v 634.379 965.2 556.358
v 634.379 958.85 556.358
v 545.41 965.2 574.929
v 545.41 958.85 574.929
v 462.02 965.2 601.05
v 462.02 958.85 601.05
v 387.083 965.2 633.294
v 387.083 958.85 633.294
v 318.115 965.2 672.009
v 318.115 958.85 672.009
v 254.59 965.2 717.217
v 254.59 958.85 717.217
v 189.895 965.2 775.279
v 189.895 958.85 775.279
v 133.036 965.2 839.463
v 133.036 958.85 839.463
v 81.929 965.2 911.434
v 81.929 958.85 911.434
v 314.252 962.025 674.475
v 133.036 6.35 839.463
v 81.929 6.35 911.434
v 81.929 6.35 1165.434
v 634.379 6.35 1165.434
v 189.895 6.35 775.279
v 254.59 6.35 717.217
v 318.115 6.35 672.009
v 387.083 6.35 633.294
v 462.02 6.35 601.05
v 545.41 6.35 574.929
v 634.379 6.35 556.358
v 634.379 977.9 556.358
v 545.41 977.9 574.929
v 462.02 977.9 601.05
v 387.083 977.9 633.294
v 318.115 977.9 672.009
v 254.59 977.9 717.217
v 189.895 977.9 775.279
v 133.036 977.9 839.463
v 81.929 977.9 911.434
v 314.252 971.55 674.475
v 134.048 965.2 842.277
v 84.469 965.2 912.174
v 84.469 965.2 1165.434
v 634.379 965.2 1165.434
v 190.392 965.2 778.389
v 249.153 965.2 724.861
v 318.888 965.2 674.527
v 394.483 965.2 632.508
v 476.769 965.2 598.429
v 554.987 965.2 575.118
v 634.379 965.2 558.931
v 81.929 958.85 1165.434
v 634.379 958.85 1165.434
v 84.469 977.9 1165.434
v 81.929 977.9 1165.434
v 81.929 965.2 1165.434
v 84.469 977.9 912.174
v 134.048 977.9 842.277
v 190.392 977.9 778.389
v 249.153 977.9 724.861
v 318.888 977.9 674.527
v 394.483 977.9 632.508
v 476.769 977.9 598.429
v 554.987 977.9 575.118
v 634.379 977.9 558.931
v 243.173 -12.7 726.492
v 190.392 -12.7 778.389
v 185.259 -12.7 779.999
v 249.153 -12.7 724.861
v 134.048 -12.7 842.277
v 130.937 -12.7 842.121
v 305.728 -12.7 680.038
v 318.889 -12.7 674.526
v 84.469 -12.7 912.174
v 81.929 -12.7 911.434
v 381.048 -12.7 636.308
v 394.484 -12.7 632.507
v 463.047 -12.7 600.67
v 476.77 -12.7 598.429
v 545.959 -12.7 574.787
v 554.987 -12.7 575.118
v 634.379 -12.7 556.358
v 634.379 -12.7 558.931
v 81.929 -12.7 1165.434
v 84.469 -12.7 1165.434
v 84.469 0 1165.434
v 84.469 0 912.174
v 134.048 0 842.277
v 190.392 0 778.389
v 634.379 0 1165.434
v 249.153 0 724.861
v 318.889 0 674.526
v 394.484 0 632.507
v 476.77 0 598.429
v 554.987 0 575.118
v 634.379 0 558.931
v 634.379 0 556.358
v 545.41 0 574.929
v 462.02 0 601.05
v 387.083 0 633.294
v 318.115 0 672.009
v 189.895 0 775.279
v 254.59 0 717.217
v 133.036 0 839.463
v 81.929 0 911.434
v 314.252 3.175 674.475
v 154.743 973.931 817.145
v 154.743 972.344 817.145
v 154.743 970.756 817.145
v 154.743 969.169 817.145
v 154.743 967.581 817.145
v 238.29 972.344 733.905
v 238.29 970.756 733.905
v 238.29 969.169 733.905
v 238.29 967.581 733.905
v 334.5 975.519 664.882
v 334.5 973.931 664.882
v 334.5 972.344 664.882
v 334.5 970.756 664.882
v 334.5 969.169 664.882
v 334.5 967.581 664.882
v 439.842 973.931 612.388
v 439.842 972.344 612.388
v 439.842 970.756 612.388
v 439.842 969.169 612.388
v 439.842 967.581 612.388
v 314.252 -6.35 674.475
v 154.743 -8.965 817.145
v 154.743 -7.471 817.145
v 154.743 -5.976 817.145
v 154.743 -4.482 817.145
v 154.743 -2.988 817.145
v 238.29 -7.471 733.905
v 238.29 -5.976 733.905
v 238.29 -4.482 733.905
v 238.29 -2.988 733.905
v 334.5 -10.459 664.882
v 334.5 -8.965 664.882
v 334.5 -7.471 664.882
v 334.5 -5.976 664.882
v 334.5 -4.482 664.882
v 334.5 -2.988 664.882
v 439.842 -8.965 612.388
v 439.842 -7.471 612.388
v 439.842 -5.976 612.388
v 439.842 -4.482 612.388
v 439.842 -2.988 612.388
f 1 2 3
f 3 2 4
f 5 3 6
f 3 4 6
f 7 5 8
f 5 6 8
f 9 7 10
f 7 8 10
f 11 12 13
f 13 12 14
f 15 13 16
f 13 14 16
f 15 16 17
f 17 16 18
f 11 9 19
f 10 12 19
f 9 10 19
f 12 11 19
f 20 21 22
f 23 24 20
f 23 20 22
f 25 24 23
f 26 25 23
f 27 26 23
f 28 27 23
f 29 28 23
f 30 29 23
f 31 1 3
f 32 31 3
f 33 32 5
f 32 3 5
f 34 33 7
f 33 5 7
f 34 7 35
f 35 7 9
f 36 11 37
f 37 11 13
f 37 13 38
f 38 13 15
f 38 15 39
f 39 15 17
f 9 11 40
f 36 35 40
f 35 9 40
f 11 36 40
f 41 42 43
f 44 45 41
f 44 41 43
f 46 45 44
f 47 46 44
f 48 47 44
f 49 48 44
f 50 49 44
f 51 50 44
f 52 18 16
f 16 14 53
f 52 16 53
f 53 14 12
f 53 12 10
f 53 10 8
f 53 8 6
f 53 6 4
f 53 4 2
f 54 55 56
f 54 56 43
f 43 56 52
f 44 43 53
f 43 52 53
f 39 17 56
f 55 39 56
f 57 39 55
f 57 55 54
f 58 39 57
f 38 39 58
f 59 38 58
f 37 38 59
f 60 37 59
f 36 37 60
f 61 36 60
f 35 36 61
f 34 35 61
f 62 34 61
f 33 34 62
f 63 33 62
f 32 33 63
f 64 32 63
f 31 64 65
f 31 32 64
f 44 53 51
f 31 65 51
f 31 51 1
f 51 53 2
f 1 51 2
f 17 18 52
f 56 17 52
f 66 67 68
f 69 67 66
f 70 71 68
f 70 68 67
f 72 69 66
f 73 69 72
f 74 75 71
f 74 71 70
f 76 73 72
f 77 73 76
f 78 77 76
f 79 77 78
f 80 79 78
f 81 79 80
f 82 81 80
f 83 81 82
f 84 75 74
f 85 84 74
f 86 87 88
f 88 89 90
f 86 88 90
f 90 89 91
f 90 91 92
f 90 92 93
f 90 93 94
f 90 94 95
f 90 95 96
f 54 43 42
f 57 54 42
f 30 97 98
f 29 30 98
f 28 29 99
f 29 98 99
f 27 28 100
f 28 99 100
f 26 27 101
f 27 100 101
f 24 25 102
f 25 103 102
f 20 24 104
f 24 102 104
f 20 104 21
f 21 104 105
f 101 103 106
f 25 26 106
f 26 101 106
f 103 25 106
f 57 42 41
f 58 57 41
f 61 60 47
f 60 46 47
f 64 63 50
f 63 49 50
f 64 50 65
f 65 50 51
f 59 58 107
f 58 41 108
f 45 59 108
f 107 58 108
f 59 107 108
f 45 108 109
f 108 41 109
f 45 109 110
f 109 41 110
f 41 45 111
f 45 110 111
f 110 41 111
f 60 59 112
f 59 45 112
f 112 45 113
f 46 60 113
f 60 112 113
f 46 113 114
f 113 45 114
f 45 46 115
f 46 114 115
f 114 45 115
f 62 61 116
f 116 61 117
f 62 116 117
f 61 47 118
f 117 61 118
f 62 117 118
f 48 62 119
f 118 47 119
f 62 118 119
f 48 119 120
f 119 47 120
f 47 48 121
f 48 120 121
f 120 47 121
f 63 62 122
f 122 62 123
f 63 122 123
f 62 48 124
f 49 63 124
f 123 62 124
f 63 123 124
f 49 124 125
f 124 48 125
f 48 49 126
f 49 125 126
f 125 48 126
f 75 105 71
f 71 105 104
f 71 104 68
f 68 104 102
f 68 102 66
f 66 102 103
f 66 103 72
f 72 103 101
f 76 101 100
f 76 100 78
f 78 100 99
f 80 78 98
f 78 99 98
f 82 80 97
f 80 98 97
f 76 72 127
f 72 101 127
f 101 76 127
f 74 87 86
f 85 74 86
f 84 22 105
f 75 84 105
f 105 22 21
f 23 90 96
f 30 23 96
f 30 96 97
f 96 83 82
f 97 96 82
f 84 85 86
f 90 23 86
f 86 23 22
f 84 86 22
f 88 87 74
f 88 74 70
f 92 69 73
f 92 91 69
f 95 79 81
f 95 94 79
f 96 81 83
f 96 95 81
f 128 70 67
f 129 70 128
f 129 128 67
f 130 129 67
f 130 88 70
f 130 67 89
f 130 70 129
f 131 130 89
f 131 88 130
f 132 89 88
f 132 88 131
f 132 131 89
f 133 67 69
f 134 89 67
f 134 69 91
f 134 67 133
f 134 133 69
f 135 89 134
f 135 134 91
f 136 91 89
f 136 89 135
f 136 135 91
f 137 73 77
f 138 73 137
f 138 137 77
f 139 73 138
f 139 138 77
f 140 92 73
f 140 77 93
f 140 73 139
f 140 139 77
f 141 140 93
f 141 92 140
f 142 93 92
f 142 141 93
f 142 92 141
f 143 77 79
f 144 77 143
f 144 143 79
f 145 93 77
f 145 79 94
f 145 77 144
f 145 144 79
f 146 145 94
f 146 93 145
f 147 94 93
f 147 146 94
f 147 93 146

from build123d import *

# Parameters (mm, degrees)
BOSS_EXTRUDE1_DEPTH     = 6.35
BOSS_EXTRUDE3_DEPTH     = 6.35
BOSS_EXTRUDE5_DEPTH     = 12.7
BOSS_EXTRUDE6_DEPTH     = 12.7
CUT_EXTRUDE4_DEPTH      = 1728.012280013
CUT_EXTRUDE4_DEPTH_BACK = 1728.012280013
SKETCH15_W              = 190.5
SKETCH15_H              = 682.13068343


with BuildPart() as part:
    # Sketch1 → Boss-Extrude1 (new body)
    with BuildSketch(Plane(origin=(0, 0, 0), x_dir=(1, 0, 0), z_dir=(0, 1, 0))):
        with BuildLine():
            Line((89.610112992, -1165.433901317), (824.879284431, -1165.433901317))
            Line((824.879284431, -1165.433901317), (824.879284431, -567.502499631))
            ThreePointArc((824.879284431, -567.502499631), (817.269099996, -549.372897811), (798.9987756, -542.107045091))
            add(Edge.make_bspline(
                [(798.9987756, -542.107045091), (310.85287448, -551.343281294), (81.929284431, -911.433901317)],
                knots=[0, 0, 0, 1, 1, 1], degree=2))
            Line((81.929284431, -911.433901317), (81.929284431, -1165.433901317))
            Line((81.929284431, -1165.433901317), (89.610112992, -1165.433901317))
        make_face()
    extrude(amount=BOSS_EXTRUDE1_DEPTH)

    # Sketch7 → Boss-Extrude5 (add)
    with BuildSketch(Plane.XZ):
        with BuildLine():
            Line((81.929284431, 1165.433901317), (81.929284431, 911.433901317))
            add(Edge.make_bspline(
                [(81.929284431, 911.433901317), (310.852874413, 551.343281399), (798.998775313, 542.107045097)],
                knots=[0, 0, 0, 1, 1, 1], degree=2))
            Line((798.998775313, 542.107045097), (799.046826225, 544.64659055))
            add(Edge.make_bspline(
                [(84.469304621, 912.17350784), (103.445986698, 882.378231607), (124.011412428, 853.993941632), (168.593594737, 800.290538619), (192.61009119, 774.971194559), (224.984358741, 745.412322476), (231.577006451, 739.605162794), (241.646710977, 731.054934835), (246.726748812, 726.819950816), (251.875344395, 722.645853927), (255.323064638, 719.876731412), (257.054292928, 718.499226905), (272.671395942, 706.189149426), (286.866852119, 695.822531973), (330.365972729, 666.398283488), (360.581983591, 649.015511653), (407.626608262, 626.099997011), (423.595021874, 618.988123553), (447.965802624, 609.087960016), (456.159095509, 605.915857466), (468.552117196, 601.346939256), (472.700305171, 599.855506437), (481.030802365, 596.93527959), (485.213538017, 595.506425964), (506.136959561, 588.541794096), (522.966553896, 583.523018507), (556.791975897, 574.49711508), (573.787817466, 570.490071848), (607.932357178, 563.406226077), (625.08106614, 560.329489378), (659.519665029, 555.035202304), (676.809563487, 552.817703848), (728.875637539, 547.360312054), (763.847710868, 545.312595399), (799.046826225, 544.64659055)],
                knots=[0, 0, 0, 0, 0.125, 0.125, 0.25, 0.25, 0.28125, 0.28125, 0.296875, 0.3046875, 0.3046875, 0.3125, 0.3125, 0.375, 0.375, 0.5, 0.5, 0.5625, 0.5625, 0.59375, 0.59375, 0.609375, 0.609375, 0.625, 0.625, 0.6875, 0.6875, 0.75, 0.75, 0.8125, 0.8125, 0.875, 0.875, 1, 1, 1, 1], degree=3))
            Line((84.469304621, 912.17350784), (84.469304621, 1162.893900935))
            Line((84.469304621, 1162.893900935), (84.469304621, 1165.433901317))
            Line((84.469304621, 1165.433901317), (82.38244461, 1165.433901317))
            Line((82.38244461, 1165.433901317), (81.929284431, 1165.433901317))
        make_face()
    extrude(amount=BOSS_EXTRUDE5_DEPTH)


with BuildPart() as body_2:
    # Sketch3 → Boss-Extrude3 (new body)
    with BuildSketch(Plane(origin=(0, 958.85, 0), x_dir=(1, 0, 0), z_dir=(0, 1, 0))):
        with BuildLine():
            Line((81.92928454, -911.433901146), (81.929284431, -1165.433901317))
            Line((81.929284431, -1165.433901317), (824.879284431, -1165.433901317))
            Line((824.879284431, -1165.433901317), (824.879284431, -567.502499631))
            ThreePointArc((824.879284431, -567.502499631), (817.269099894, -549.37289771), (798.998775313, -542.107045097))
            add(Edge.make_bspline(
                [(798.998775313, -542.107045097), (310.852874529, -551.343281397), (81.92928454, -911.433901146)],
                knots=[0, 0, 0, 1, 1, 1], degree=2))
        make_face()
    extrude(amount=BOSS_EXTRUDE3_DEPTH)

    # Sketch8 → Boss-Extrude6 (add)
    with BuildSketch(Plane(origin=(0, 965.2, 0), x_dir=(1, 0, 0), z_dir=(0, 1, 0))):
        with BuildLine():
            Line((799.046826225, -544.64659055), (798.998775546, -542.107045092))
            add(Edge.make_bspline(
                [(798.998775546, -542.107045092), (310.852874466, -551.343281313), (81.92928443, -911.433901319)],
                knots=[0, 0, 0, 1, 1, 1], degree=2))
            Line((81.92928443, -911.433901319), (81.929284431, -1165.433901317))
            Line((81.929284431, -1165.433901317), (84.469304621, -1165.433901317))
            Line((84.469304621, -1165.433901317), (84.469304621, -912.17350784))
            add(Edge.make_bspline(
                [(84.469304621, -912.17350784), (103.445986698, -882.378231607), (124.011412428, -853.993941632), (168.593594737, -800.290538619), (192.61009119, -774.971194559), (224.984358741, -745.412322476), (236.521490923, -735.24979187), (248.427624153, -725.414976442), (255.323064638, -719.876731412), (257.054292928, -718.499226905), (272.671395942, -706.189149426), (286.866852119, -695.822531973), (330.365972729, -666.398283488), (360.581983591, -649.015511653), (407.626608262, -626.099997011), (423.595021874, -618.988123553), (447.965802624, -609.087960016), (460.255741598, -604.329805543), (472.700305171, -599.855506437), (481.030802365, -596.93527959), (485.213538017, -595.506425964), (506.136959561, -588.541794096), (522.966553896, -583.523018507), (556.791975897, -574.49711508), (573.787817466, -570.490071848), (607.932357178, -563.406226077), (625.08106614, -560.329489378), (659.519665029, -555.035202304), (676.809563487, -552.817703848), (728.875637539, -547.360312054), (763.847710868, -545.312595399), (799.046826225, -544.64659055)],
                knots=[0, 0, 0, 0, 0.125, 0.125, 0.25, 0.25, 0.28125, 0.3046875, 0.3046875, 0.3125, 0.3125, 0.375, 0.375, 0.5, 0.5, 0.5625, 0.5625, 0.59375, 0.609375, 0.609375, 0.625, 0.625, 0.6875, 0.6875, 0.75, 0.75, 0.8125, 0.8125, 0.875, 0.875, 1, 1, 1, 1], degree=3))
        make_face()
    extrude(amount=BOSS_EXTRUDE6_DEPTH)


with BuildPart() as cut_extrude4_tool:
    # Sketch15 → Cut-Extrude4 (new, two sides: drawn at the far end of the back side and taken through both)
    with BuildSketch(Plane(origin=(0, 958.85, 0), x_dir=(1, 0, 0), z_dir=(0, 1, 0)).offset(-CUT_EXTRUDE4_DEPTH_BACK)):
        with Locations((729.629284431, -824.368559602)):
            Rectangle(SKETCH15_W, SKETCH15_H)
    extrude(amount=CUT_EXTRUDE4_DEPTH + CUT_EXTRUDE4_DEPTH_BACK)


with BuildPart() as part_1:
    add(part.part)

    # Cut-Extrude4: cut by cut_extrude4_tool
    add(cut_extrude4_tool.part, mode=Mode.SUBTRACT)


with BuildPart() as body_2_1:
    add(body_2.part)

    # Cut-Extrude4: cut by cut_extrude4_tool
    add(cut_extrude4_tool.part, mode=Mode.SUBTRACT)


solid = Compound([part_1.part, body_2_1.part])
